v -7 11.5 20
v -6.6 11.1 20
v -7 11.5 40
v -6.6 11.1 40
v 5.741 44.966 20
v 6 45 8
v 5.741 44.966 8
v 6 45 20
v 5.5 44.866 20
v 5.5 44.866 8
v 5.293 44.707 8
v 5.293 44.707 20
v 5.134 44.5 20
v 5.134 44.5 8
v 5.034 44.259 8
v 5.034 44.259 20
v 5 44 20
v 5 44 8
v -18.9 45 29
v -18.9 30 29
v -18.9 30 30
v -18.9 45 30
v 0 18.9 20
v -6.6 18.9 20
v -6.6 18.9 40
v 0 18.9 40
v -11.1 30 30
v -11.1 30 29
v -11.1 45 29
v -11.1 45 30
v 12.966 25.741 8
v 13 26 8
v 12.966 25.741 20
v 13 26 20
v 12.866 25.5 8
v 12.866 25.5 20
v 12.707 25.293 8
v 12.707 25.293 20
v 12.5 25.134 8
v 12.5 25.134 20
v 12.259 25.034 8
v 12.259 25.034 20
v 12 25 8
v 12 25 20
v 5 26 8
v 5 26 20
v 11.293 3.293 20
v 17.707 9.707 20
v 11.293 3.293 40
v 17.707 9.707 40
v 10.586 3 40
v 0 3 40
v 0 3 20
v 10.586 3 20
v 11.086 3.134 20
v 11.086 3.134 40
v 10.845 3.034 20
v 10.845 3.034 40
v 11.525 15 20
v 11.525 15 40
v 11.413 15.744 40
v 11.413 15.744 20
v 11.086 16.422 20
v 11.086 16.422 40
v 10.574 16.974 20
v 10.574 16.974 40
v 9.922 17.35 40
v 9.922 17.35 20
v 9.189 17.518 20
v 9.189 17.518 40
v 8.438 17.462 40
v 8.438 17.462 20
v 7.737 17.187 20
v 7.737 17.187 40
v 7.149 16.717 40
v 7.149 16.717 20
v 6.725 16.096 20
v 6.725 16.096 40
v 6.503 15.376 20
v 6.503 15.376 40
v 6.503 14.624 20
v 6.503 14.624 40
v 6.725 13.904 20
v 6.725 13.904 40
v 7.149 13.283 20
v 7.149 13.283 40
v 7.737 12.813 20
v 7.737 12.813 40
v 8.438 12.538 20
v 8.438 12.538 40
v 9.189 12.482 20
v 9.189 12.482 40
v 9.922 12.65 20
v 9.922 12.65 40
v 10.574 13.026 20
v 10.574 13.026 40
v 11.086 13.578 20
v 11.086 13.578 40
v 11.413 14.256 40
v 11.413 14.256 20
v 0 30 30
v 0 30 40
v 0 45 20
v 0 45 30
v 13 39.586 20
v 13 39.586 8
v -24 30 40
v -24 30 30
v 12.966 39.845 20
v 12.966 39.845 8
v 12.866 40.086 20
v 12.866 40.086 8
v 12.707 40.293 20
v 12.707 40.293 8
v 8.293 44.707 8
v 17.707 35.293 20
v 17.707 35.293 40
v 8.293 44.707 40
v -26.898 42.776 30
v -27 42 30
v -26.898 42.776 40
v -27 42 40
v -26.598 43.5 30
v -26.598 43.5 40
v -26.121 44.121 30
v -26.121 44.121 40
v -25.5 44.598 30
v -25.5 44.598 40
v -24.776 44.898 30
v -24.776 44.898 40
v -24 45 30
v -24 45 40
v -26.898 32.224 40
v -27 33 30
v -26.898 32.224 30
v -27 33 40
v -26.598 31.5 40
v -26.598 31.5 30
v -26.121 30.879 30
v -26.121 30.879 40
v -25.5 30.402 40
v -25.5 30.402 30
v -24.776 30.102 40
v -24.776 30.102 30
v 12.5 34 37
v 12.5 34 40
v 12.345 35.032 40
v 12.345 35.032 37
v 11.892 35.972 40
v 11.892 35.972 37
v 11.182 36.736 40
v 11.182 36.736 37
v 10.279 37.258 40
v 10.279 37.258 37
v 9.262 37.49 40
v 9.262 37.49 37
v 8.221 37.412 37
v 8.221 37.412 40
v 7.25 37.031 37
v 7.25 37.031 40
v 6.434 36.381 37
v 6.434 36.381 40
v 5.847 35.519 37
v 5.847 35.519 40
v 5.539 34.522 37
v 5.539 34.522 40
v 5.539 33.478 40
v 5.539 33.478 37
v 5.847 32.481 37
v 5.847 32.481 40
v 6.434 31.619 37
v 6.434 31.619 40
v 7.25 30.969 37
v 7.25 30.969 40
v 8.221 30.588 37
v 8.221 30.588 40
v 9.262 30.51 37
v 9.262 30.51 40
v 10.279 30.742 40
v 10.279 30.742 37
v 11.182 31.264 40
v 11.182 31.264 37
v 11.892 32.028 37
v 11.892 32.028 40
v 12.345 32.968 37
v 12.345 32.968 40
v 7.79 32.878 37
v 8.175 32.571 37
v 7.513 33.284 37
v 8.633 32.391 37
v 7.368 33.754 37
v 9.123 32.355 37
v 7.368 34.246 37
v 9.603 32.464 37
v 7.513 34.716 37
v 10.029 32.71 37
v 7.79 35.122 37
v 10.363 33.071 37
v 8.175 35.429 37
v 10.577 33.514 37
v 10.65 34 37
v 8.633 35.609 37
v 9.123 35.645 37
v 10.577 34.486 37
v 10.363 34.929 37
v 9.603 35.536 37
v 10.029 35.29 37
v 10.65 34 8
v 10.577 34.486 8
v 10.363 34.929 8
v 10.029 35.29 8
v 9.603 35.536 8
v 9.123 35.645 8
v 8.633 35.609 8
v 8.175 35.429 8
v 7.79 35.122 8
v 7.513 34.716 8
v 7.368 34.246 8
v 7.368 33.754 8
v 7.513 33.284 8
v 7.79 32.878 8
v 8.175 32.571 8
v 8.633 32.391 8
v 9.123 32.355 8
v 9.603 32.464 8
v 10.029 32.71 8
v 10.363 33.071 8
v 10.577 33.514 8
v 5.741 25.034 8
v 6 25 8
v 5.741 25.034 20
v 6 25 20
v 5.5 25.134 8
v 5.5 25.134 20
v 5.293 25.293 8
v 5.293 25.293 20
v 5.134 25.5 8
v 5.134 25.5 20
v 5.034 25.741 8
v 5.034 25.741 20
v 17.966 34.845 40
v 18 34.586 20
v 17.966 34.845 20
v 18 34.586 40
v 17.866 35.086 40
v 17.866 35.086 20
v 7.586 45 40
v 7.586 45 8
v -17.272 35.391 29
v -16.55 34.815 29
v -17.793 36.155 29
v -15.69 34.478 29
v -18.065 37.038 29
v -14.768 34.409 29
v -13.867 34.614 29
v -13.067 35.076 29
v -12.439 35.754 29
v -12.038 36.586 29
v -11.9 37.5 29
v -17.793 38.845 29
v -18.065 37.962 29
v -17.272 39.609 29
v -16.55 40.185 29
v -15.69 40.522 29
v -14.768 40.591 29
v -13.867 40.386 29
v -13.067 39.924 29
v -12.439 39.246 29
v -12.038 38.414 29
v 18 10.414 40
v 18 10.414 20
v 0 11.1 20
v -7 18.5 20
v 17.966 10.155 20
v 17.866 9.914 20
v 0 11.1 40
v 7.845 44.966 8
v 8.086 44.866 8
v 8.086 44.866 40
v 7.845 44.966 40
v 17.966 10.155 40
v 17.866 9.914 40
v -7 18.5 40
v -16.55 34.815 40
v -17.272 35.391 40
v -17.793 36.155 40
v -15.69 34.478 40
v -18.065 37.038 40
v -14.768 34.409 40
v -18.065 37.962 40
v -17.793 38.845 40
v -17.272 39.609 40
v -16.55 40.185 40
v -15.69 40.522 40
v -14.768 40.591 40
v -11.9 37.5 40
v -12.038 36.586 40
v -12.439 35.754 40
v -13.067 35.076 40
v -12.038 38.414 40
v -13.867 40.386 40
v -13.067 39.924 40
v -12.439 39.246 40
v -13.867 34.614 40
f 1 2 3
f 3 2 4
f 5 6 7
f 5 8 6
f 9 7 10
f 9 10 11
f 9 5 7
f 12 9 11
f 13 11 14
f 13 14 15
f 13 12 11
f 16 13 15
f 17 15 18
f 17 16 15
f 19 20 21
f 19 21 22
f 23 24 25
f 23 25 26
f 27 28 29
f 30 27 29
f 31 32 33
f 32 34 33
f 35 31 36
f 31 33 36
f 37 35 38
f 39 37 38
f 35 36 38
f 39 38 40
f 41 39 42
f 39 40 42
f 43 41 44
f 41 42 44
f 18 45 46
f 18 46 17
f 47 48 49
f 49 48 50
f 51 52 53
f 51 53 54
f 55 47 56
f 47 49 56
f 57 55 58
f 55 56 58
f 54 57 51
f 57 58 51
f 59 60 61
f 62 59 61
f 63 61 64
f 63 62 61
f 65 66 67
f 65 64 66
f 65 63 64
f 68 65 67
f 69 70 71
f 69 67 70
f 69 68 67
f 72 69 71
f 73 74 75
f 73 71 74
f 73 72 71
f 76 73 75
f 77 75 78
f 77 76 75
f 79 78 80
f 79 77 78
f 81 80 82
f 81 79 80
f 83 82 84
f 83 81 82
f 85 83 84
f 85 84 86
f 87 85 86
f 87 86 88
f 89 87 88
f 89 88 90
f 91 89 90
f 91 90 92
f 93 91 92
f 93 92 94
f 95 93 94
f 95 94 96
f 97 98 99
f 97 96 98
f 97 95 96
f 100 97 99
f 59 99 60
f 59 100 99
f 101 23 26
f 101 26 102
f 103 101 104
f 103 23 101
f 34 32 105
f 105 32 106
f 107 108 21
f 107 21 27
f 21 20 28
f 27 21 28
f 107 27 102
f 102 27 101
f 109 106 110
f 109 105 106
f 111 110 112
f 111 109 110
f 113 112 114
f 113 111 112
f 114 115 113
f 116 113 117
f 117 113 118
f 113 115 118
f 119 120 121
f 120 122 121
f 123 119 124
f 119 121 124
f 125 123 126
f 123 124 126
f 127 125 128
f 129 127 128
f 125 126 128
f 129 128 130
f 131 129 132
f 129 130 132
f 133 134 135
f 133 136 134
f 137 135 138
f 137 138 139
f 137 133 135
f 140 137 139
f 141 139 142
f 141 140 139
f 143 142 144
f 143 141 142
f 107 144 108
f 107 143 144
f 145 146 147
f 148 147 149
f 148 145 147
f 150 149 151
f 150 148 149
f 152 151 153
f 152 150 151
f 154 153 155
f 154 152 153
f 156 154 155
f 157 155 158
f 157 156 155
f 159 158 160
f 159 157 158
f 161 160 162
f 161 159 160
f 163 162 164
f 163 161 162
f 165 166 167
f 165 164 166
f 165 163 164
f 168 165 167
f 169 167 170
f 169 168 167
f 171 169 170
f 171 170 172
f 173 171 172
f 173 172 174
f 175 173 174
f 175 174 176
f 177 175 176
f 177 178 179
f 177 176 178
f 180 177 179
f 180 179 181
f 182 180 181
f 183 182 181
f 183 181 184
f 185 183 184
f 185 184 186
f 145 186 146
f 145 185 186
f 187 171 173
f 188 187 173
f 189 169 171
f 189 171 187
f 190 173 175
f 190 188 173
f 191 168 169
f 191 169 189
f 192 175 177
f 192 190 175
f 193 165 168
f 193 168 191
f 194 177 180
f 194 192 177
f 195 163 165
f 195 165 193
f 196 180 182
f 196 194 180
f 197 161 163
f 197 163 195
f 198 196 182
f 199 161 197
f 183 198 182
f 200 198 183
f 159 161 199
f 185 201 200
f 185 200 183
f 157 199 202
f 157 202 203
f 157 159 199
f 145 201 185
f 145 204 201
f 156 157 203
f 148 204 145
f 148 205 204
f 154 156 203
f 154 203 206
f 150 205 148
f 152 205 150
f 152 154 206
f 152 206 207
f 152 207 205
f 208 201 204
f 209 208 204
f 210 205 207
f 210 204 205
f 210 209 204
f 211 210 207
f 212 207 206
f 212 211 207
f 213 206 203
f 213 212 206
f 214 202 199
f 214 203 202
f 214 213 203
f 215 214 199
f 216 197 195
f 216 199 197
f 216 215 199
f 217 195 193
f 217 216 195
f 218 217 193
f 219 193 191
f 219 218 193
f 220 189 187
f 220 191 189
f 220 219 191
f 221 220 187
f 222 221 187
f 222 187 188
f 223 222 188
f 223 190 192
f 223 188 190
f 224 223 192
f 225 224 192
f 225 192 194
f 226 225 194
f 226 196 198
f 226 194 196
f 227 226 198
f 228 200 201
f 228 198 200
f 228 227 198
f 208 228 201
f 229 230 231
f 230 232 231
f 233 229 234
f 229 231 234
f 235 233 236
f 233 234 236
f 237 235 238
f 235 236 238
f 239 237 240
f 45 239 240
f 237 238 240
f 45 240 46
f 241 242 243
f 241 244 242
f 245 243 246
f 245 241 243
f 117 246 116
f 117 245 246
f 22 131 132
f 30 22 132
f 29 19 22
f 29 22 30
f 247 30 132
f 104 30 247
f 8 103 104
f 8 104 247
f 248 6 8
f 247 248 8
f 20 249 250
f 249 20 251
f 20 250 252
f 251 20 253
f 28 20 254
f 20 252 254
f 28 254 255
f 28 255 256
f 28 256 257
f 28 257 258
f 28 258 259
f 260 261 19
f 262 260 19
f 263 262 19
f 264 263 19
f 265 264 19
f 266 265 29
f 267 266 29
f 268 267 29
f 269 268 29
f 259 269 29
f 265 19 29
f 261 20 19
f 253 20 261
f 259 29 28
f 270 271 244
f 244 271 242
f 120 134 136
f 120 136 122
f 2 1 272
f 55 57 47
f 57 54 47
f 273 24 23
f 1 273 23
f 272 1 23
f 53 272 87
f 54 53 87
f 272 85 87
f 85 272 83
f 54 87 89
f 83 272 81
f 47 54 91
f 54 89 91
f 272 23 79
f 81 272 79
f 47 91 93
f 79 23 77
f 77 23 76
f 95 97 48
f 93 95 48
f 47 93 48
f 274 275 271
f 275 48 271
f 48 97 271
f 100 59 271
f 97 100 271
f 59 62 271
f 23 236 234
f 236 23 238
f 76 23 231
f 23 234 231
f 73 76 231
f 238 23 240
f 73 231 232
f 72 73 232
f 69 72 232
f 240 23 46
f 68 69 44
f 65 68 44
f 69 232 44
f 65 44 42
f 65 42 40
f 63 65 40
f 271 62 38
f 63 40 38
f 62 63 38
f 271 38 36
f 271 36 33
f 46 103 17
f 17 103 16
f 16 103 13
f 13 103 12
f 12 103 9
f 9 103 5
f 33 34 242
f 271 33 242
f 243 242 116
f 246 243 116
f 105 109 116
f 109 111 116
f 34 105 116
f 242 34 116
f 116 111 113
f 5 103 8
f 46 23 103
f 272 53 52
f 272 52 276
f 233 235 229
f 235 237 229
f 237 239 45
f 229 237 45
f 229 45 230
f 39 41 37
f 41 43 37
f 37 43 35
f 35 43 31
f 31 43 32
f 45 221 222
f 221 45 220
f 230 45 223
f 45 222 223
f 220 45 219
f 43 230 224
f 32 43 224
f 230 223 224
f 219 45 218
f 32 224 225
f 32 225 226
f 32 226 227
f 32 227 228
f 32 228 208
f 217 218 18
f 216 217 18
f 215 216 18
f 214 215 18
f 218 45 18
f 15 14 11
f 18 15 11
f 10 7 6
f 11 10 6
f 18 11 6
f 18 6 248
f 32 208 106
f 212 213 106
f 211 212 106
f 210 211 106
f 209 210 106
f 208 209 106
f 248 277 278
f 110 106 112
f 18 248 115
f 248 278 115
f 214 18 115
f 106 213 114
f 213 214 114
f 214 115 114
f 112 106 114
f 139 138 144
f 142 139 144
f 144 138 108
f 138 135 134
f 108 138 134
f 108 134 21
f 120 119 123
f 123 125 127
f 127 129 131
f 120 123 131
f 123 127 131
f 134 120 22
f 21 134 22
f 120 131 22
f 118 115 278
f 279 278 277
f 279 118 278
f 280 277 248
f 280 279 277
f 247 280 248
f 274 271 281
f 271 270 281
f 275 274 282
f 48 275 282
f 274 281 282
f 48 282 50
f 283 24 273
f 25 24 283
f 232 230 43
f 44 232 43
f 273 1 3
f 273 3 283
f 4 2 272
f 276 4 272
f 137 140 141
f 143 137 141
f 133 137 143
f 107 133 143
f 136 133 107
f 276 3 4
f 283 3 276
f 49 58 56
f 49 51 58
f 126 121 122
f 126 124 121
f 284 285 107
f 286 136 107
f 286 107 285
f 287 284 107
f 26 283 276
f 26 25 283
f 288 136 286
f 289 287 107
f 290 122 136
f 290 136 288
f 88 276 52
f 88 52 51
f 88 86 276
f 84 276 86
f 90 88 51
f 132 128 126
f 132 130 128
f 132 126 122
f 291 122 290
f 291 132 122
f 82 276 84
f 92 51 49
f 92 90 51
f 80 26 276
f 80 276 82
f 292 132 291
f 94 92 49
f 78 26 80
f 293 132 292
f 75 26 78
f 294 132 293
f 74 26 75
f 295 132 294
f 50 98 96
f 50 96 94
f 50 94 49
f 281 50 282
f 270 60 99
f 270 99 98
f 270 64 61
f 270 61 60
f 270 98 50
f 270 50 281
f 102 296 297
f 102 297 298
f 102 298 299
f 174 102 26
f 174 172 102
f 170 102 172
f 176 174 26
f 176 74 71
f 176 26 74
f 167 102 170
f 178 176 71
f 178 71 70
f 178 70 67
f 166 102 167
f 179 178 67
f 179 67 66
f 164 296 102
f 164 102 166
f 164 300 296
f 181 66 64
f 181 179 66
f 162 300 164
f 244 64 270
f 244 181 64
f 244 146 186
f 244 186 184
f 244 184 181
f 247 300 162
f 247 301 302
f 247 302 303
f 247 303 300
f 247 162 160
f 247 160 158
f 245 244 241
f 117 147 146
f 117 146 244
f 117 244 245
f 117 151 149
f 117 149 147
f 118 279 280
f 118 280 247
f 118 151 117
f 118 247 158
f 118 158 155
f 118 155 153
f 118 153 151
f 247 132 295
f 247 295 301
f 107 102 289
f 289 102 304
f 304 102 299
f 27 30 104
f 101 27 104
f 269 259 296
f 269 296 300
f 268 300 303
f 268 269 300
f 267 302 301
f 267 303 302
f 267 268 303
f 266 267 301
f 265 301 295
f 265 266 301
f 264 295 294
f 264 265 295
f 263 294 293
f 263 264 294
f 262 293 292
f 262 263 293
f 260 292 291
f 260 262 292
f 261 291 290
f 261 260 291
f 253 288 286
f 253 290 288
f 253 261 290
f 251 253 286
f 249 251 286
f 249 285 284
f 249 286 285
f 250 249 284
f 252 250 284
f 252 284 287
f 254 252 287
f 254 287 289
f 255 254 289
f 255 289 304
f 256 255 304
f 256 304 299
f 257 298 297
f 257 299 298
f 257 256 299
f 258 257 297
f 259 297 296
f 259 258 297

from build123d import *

# Parameters (mm, degrees)
CYLINDER005_R     = 1.65
CYLINDER005_DEPTH = 40
CYLINDER001_R     = 2.525
CYLINDER001_DEPTH = 35
CYLINDER006_R     = 3.5
CYLINDER006_DEPTH = 10
CYLINDER_R        = 3.1
CYLINDER_DEPTH    = 15
BOX001_W          = 18
BOX001_H          = 42
BOX001_DEPTH      = 20
CHAMFER013_SIZE   = 7
CHAMFER016_SIZE   = 10
FILLET002_R       = 1
BOX002_W          = 7
BOX002_H          = 7.8
BOX002_DEPTH      = 20
CHAMFER011_SIZE   = 0.4
BOX015_W          = 8
BOX015_H          = 20
BOX015_DEPTH      = 12
CHAMFER009_SIZE   = 5
FILLET001_R       = 1
FILLET003_R       = 1
BOX013_W          = 7.8
BOX013_H          = 15
BOX013_DEPTH      = 1
BOX011_W          = 27
BOX011_H          = 15
BOX011_DEPTH      = 10
FILLET_R          = 3


with BuildPart() as cylinder005:
    # Cylinder005 → Cylinder005 (new body)
    with BuildSketch(Plane(origin=(9, 34, 3), x_dir=(1, 0, 0), z_dir=(0, 0, 1))):
        Circle(CYLINDER005_R)
    extrude(amount=CYLINDER005_DEPTH)


with BuildPart() as cylinder001:
    # Cylinder001 → Cylinder001 (new body)
    with BuildSketch(Plane(origin=(9, 15, 13), x_dir=(1, 0, 0), z_dir=(0, 0, 1))):
        Circle(CYLINDER001_R)
    extrude(amount=CYLINDER001_DEPTH)


with BuildPart() as cylinder006:
    # Cylinder006 → Cylinder006 (new body)
    with BuildSketch(Plane(origin=(9, 34, 37), x_dir=(1, 0, 0), z_dir=(0, 0, 1))):
        Circle(CYLINDER006_R)
    extrude(amount=CYLINDER006_DEPTH)


with BuildPart() as cylinder:
    # Cylinder → Cylinder (new body)
    with BuildSketch(Plane(origin=(-15, 37.5, 27), x_dir=(1, 0, 0), z_dir=(0, 0, 1))):
        Circle(CYLINDER_R)
    extrude(amount=CYLINDER_DEPTH)


with BuildPart() as fillet002:
    # Box001 → Box001 (new body)
    with BuildSketch(Plane(origin=(0, 3, 20), x_dir=(1, 0, 0), z_dir=(0, 0, 1))):
        with Locations((9, 21)):
            Rectangle(BOX001_W, BOX001_H)
    extrude(amount=BOX001_DEPTH)

    # Chamfer013
    chamfer013_edges = [fillet002.edges().sort_by_distance(p)[0] for p in [
        (18, 3, 30),
    ]]
    chamfer(chamfer013_edges, length=CHAMFER013_SIZE)

    # Chamfer016
    chamfer016_edges = [fillet002.edges().sort_by_distance(p)[0] for p in [
        (18, 45, 30),
    ]]
    chamfer(chamfer016_edges, length=CHAMFER016_SIZE)

    # Fillet002
    fillet002_edges = [fillet002.edges().sort_by_distance(p)[0] for p in [
        (18, 35, 30),
        (18, 10, 30),
        (8, 45, 30),
        (11, 3, 30),
    ]]
    fillet(fillet002_edges, radius=FILLET002_R)


with BuildPart() as chamfer011:
    # Box002 → Box002 (new body)
    with BuildSketch(Plane(origin=(-7, 11.1, 20), x_dir=(1, 0, 0), z_dir=(0, 0, 1))):
        with Locations((3.5, 3.9)):
            Rectangle(BOX002_W, BOX002_H)
    extrude(amount=BOX002_DEPTH)

    # Chamfer011
    chamfer011_edges = [chamfer011.edges().sort_by_distance(p)[0] for p in [
        (-7, 11.1, 30),
        (-7, 18.9, 30),
    ]]
    chamfer(chamfer011_edges, length=CHAMFER011_SIZE)


with BuildPart() as fillet003:
    # Box015 → Box015 (new body)
    with BuildSketch(Plane(origin=(7, 25, 8), x_dir=(1, 0, 0), z_dir=(0, 0, 1))):
        with Locations((4, 10)):
            Rectangle(BOX015_W, BOX015_H)
    extrude(amount=BOX015_DEPTH)

    # Chamfer009
    chamfer009_edges = [fillet003.edges().sort_by_distance(p)[0] for p in [
        (15, 45, 14),
    ]]
    chamfer(chamfer009_edges, length=CHAMFER009_SIZE)

    # Fillet001
    fillet001_edges = [fillet003.edges().sort_by_distance(p)[0] for p in [
        (15, 40, 14),
        (15, 25, 14),
        (7, 25, 14),
        (7, 45, 14),
    ]]
    fillet(fillet001_edges, radius=FILLET001_R)


with BuildPart() as fillet003_1:
    # Fillet001 placement: moved
    add(fillet003.part.moved(Location((-2, 0, 0))))

    # Fillet003
    fillet003_edges = [fillet003_1.edges().sort_by_distance(p)[0] for p in [
        (8, 45, 14),
    ]]
    fillet(fillet003_edges, radius=FILLET003_R)


with BuildPart() as cube013:
    # Box013 → Box013 (new body)
    with BuildSketch(Plane(origin=(-18.9, 30, 29), x_dir=(1, 0, 0), z_dir=(0, 0, 1))):
        with Locations((3.9, 7.5)):
            Rectangle(BOX013_W, BOX013_H)
    extrude(amount=BOX013_DEPTH)


with BuildPart() as cut002002002007004:
    # Box011 → Box011 (new body)
    with BuildSketch(Plane(origin=(-27, 30, 30), x_dir=(1, 0, 0), z_dir=(0, 0, 1))):
        with Locations((13.5, 7.5)):
            Rectangle(BOX011_W, BOX011_H)
    extrude(amount=BOX011_DEPTH)

    # Fillet
    fillet_edges = [cut002002002007004.edges().sort_by_distance(p)[0] for p in [
        (-27, 30, 35),
        (-27, 45, 35),
    ]]
    fillet(fillet_edges, radius=FILLET_R)

    # Fusion: union Cube013
    add(cube013.part)

    # Fusion006004: union Fillet002, Chamfer011, Fillet003
    add(fillet002.part)
    add(chamfer011.part)
    add(fillet003_1.part)

    # Cut: cut Cylinder
    add(cylinder.part, mode=Mode.SUBTRACT)

    # Cut002002002007002: cut Cylinder006
    add(cylinder006.part, mode=Mode.SUBTRACT)

    # Cut002002002007003: cut Cylinder001
    add(cylinder001.part, mode=Mode.SUBTRACT)

    # Cut002002002007004: cut Cylinder005
    add(cylinder005.part, mode=Mode.SUBTRACT)


solid = cut002002002007004.part
